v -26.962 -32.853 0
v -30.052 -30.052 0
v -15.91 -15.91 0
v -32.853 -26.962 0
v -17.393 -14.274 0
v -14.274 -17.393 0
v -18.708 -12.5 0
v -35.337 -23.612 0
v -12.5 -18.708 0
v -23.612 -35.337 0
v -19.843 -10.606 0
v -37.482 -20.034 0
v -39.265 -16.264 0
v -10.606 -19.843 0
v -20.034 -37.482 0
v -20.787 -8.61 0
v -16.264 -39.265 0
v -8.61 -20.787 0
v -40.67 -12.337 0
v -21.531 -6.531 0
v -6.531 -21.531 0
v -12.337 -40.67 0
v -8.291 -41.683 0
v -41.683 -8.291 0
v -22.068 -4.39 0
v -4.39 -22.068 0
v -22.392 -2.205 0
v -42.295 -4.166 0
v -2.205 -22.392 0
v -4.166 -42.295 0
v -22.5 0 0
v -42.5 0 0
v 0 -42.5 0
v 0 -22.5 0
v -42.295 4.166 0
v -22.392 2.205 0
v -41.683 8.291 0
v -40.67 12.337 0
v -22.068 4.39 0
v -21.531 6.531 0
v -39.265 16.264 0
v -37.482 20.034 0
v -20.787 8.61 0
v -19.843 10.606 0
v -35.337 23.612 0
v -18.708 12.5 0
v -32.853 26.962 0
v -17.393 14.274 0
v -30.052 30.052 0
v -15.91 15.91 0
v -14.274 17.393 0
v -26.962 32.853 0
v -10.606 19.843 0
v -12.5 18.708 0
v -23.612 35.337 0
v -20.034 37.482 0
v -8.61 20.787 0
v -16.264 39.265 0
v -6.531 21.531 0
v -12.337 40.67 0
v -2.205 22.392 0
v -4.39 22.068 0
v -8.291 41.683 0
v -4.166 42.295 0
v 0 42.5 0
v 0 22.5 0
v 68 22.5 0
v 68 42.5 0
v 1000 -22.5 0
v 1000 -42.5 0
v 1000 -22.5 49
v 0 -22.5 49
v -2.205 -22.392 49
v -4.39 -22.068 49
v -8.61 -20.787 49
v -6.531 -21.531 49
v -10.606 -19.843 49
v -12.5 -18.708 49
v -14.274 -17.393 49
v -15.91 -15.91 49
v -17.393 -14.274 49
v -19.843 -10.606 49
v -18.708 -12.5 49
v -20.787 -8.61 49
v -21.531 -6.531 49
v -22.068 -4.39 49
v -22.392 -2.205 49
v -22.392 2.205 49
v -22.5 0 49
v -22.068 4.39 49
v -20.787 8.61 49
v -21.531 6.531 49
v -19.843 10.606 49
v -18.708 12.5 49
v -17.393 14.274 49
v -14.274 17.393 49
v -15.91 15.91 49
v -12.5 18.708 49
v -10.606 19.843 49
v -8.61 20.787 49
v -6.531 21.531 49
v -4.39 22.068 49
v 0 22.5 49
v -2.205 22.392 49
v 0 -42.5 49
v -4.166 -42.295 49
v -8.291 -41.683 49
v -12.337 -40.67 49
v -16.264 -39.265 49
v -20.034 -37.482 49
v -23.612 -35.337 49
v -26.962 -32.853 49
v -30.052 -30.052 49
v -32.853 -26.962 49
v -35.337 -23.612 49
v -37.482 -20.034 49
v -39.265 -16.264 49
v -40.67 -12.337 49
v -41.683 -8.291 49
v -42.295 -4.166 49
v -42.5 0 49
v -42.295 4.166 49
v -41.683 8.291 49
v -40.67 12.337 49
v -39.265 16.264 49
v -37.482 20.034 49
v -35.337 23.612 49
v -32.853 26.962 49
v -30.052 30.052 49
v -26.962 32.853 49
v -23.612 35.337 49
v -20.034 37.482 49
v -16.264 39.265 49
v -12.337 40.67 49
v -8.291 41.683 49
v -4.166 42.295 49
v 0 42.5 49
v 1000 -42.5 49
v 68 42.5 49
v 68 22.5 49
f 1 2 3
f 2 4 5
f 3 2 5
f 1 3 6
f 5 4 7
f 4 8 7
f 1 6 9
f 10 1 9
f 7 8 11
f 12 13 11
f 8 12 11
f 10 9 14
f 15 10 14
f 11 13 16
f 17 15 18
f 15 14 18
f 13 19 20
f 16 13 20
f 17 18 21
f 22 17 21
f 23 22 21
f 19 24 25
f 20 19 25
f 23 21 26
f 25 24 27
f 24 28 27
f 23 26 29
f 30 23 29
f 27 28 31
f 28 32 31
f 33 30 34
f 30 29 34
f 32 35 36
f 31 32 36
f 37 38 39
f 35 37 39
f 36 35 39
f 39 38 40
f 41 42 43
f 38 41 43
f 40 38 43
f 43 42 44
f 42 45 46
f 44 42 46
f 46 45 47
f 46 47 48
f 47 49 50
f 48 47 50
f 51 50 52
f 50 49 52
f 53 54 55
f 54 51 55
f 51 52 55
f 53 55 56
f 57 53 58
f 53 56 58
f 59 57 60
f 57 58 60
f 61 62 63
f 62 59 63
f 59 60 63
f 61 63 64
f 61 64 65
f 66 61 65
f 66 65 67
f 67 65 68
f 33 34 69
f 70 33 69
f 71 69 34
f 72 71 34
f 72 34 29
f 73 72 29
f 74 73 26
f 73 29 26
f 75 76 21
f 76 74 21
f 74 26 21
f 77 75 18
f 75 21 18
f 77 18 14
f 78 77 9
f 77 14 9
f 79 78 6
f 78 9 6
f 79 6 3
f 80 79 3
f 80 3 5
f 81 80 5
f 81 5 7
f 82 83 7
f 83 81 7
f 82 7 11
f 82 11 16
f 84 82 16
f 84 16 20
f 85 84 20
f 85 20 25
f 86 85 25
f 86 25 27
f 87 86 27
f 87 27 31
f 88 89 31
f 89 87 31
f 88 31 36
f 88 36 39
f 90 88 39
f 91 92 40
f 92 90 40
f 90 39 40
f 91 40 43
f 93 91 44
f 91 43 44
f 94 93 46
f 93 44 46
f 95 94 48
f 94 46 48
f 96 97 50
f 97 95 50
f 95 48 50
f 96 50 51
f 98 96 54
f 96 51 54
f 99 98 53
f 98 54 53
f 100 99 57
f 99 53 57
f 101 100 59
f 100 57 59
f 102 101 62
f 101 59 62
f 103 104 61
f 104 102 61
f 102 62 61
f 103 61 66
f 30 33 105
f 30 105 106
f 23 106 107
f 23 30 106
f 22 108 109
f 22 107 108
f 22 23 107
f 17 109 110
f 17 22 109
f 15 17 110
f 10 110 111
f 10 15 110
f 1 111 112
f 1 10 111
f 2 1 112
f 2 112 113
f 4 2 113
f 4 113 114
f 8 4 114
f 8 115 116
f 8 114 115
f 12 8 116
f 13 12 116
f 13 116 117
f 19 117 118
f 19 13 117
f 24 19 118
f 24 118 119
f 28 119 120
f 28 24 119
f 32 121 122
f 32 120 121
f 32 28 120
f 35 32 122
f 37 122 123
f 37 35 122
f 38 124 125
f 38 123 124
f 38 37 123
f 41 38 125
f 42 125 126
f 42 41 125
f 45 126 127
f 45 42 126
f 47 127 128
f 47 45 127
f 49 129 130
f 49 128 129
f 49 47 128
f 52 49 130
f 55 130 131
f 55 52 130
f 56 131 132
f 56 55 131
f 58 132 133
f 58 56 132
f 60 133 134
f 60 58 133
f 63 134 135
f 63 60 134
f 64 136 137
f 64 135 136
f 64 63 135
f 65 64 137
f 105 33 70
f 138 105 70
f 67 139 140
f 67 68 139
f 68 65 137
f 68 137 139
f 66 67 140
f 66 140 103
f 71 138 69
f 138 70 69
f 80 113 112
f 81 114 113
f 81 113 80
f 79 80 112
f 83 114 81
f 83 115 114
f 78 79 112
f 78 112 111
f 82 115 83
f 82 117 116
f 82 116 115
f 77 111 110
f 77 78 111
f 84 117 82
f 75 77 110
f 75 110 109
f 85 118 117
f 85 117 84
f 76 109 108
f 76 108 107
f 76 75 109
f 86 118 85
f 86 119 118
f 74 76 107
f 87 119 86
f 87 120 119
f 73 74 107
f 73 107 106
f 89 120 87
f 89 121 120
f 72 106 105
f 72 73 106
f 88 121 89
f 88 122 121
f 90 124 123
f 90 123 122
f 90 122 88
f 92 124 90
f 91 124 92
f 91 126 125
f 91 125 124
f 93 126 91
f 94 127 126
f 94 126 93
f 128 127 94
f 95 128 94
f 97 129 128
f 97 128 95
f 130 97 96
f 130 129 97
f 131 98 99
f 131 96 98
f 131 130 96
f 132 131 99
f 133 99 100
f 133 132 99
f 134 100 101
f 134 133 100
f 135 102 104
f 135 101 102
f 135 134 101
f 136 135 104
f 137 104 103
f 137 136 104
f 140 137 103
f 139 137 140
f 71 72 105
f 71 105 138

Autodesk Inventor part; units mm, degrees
ref_plane "YZ Plane" through (0, 0, 0) normal (1, 0, 0) x (0, 1, 0)
ref_plane "XZ Plane" through (0, 0, 0) normal (0, 1, 0) x (-1, 0, 0)
ref_plane "XY Plane" through (0, 0, 0) normal (0, 0, 1) x (1, 0, 0)
sketch "Sketch1" plane through (0, 0, 0) normal (0, 0, 1) x (1, 0, 0)
  circle A0 centre (0, 0) radius 42.5
  line L0 (0, -42.5) -> (1000, -42.5)
  line L1 (1000, -42.5) -> (1000, -22.5)
  line L2 (1000, -22.5) -> (0, -22.5)
  line L3 (0, -22.5) -> (0, -42.5)
  line L4 (0, 42.5) -> (68, 42.5)
  line L5 (68, 42.5) -> (68, 22.5)
  line L6 (68, 22.5) -> (0, 22.5)
  line L7 (0, 22.5) -> (0, 42.5)
  circle A1 centre (0, 0) radius 22.5
  point P0 (0, -22.5)
  point P1 (0, 22.5)
  dimension "d0" = 85
  dimension "d1" = 20
  dimension "d2" = 20
  dimension "d4" = 1000
  dimension "d7" = 68
extrude "Extrusion1" add sketch "Sketch1" along normal blind 49 contours L7 A1 L3 A0 | L4 L5 L6 A0 | A0 L6 L7 | L3 L2 A0 | A0 L2 L1 L0
properties part number "J15BF.1.40_Yaxis"
